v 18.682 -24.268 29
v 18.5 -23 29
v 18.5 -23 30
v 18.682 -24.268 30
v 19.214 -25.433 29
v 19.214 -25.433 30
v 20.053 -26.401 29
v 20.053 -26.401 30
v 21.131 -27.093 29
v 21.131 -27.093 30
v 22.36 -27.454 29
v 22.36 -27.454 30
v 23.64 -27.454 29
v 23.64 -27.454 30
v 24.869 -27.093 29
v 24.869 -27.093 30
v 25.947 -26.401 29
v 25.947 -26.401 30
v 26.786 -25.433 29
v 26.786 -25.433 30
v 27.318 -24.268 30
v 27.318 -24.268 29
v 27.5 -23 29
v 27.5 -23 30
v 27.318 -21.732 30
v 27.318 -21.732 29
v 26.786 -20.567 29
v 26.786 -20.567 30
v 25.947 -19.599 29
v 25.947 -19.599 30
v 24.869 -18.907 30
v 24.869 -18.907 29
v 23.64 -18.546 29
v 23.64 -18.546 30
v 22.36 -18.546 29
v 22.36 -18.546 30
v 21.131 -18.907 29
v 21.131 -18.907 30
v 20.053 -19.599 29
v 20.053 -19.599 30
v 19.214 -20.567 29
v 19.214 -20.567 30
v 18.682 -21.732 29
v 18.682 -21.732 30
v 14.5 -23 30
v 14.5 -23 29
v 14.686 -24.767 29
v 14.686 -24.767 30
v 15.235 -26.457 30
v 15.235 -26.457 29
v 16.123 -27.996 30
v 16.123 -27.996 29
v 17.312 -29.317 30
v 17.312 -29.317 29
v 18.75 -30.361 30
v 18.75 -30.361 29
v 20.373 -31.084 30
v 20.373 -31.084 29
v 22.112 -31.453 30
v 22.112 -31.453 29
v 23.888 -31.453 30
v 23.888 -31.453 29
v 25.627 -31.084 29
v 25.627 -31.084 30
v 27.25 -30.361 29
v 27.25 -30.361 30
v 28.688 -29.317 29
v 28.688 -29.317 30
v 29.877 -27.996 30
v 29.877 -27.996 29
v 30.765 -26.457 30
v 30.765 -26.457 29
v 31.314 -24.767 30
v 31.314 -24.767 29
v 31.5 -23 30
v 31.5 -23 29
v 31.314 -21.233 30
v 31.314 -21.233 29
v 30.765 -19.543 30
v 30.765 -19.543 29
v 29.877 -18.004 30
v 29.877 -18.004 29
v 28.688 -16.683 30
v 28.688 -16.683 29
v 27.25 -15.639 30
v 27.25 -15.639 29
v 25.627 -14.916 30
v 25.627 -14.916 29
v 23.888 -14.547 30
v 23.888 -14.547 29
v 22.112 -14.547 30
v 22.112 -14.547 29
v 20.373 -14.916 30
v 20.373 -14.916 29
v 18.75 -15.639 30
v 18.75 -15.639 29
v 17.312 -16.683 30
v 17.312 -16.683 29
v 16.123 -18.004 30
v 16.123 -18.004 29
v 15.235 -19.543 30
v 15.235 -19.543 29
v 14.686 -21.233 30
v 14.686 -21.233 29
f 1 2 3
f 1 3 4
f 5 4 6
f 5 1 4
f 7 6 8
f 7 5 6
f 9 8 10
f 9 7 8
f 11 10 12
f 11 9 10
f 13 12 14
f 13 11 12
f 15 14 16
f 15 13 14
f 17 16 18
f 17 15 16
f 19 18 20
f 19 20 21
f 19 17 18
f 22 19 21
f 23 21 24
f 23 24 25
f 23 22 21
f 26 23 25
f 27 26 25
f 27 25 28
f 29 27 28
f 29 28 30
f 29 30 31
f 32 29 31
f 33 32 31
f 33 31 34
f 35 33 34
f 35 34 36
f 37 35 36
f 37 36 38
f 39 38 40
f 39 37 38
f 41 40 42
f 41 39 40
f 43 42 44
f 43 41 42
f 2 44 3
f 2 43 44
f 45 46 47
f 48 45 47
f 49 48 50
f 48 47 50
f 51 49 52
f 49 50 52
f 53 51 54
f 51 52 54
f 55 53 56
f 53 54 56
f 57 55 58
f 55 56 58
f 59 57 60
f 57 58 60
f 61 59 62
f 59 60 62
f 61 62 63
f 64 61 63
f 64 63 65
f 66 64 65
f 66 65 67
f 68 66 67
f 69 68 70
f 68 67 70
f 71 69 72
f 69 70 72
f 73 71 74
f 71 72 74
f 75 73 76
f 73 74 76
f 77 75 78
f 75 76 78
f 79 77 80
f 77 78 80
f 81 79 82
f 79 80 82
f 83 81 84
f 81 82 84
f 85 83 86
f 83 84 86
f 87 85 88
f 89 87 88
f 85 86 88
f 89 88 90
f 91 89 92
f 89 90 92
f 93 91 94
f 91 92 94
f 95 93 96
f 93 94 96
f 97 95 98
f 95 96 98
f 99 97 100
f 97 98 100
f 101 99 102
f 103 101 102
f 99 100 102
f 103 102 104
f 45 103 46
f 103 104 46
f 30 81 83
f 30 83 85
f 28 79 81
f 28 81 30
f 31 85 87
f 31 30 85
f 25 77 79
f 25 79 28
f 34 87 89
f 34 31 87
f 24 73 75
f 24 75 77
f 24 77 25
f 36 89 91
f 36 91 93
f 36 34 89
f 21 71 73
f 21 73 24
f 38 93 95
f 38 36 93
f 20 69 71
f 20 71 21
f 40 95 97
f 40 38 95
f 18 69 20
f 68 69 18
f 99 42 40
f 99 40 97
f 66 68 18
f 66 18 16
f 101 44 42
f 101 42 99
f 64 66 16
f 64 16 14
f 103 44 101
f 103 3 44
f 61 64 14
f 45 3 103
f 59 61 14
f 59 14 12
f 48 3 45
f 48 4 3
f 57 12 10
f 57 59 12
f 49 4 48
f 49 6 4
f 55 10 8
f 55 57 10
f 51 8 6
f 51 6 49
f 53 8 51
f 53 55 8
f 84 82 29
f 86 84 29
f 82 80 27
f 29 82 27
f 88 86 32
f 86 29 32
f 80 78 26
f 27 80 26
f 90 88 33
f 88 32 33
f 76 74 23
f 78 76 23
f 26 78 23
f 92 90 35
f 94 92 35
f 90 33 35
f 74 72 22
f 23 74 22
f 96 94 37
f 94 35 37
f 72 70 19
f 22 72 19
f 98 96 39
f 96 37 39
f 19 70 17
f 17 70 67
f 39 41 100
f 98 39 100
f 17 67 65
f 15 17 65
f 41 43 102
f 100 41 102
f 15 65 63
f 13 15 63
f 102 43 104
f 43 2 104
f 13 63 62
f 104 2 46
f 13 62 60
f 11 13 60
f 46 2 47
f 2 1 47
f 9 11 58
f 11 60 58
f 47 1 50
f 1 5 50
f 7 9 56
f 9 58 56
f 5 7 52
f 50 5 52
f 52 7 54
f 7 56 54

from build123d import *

# Parameters (mm, degrees)
SKETCH021_R   = 8.5
SKETCH021_R_2 = 4.5
PAD023_DEPTH  = 1


with BuildPart() as clone_of_spacer:
    # Sketch021 → Pad023 (new body)
    with BuildSketch(Plane.XY.offset(29)):
        with Locations((-23, 23)):
            Circle(SKETCH021_R)
        with Locations((-23, 23)):
            Circle(SKETCH021_R_2, mode=Mode.SUBTRACT)
    extrude(amount=PAD023_DEPTH)


with BuildPart() as part_mirroring042:
    # Part__Mirroring042: instance of Clone of spacer
    add(clone_of_spacer.part.mirror(Plane(origin=(0, 0, 0), x_dir=(1, 0, 0), z_dir=(0, 1, 0))))


with BuildPart() as part_mirroring044:
    # Part__Mirroring044: instance of Part__Mirroring042
    add(part_mirroring042.part.mirror(Plane(origin=(0, 0, 0), x_dir=(0, -1, 0), z_dir=(1, 0, 0))))


solid = part_mirroring044.part
